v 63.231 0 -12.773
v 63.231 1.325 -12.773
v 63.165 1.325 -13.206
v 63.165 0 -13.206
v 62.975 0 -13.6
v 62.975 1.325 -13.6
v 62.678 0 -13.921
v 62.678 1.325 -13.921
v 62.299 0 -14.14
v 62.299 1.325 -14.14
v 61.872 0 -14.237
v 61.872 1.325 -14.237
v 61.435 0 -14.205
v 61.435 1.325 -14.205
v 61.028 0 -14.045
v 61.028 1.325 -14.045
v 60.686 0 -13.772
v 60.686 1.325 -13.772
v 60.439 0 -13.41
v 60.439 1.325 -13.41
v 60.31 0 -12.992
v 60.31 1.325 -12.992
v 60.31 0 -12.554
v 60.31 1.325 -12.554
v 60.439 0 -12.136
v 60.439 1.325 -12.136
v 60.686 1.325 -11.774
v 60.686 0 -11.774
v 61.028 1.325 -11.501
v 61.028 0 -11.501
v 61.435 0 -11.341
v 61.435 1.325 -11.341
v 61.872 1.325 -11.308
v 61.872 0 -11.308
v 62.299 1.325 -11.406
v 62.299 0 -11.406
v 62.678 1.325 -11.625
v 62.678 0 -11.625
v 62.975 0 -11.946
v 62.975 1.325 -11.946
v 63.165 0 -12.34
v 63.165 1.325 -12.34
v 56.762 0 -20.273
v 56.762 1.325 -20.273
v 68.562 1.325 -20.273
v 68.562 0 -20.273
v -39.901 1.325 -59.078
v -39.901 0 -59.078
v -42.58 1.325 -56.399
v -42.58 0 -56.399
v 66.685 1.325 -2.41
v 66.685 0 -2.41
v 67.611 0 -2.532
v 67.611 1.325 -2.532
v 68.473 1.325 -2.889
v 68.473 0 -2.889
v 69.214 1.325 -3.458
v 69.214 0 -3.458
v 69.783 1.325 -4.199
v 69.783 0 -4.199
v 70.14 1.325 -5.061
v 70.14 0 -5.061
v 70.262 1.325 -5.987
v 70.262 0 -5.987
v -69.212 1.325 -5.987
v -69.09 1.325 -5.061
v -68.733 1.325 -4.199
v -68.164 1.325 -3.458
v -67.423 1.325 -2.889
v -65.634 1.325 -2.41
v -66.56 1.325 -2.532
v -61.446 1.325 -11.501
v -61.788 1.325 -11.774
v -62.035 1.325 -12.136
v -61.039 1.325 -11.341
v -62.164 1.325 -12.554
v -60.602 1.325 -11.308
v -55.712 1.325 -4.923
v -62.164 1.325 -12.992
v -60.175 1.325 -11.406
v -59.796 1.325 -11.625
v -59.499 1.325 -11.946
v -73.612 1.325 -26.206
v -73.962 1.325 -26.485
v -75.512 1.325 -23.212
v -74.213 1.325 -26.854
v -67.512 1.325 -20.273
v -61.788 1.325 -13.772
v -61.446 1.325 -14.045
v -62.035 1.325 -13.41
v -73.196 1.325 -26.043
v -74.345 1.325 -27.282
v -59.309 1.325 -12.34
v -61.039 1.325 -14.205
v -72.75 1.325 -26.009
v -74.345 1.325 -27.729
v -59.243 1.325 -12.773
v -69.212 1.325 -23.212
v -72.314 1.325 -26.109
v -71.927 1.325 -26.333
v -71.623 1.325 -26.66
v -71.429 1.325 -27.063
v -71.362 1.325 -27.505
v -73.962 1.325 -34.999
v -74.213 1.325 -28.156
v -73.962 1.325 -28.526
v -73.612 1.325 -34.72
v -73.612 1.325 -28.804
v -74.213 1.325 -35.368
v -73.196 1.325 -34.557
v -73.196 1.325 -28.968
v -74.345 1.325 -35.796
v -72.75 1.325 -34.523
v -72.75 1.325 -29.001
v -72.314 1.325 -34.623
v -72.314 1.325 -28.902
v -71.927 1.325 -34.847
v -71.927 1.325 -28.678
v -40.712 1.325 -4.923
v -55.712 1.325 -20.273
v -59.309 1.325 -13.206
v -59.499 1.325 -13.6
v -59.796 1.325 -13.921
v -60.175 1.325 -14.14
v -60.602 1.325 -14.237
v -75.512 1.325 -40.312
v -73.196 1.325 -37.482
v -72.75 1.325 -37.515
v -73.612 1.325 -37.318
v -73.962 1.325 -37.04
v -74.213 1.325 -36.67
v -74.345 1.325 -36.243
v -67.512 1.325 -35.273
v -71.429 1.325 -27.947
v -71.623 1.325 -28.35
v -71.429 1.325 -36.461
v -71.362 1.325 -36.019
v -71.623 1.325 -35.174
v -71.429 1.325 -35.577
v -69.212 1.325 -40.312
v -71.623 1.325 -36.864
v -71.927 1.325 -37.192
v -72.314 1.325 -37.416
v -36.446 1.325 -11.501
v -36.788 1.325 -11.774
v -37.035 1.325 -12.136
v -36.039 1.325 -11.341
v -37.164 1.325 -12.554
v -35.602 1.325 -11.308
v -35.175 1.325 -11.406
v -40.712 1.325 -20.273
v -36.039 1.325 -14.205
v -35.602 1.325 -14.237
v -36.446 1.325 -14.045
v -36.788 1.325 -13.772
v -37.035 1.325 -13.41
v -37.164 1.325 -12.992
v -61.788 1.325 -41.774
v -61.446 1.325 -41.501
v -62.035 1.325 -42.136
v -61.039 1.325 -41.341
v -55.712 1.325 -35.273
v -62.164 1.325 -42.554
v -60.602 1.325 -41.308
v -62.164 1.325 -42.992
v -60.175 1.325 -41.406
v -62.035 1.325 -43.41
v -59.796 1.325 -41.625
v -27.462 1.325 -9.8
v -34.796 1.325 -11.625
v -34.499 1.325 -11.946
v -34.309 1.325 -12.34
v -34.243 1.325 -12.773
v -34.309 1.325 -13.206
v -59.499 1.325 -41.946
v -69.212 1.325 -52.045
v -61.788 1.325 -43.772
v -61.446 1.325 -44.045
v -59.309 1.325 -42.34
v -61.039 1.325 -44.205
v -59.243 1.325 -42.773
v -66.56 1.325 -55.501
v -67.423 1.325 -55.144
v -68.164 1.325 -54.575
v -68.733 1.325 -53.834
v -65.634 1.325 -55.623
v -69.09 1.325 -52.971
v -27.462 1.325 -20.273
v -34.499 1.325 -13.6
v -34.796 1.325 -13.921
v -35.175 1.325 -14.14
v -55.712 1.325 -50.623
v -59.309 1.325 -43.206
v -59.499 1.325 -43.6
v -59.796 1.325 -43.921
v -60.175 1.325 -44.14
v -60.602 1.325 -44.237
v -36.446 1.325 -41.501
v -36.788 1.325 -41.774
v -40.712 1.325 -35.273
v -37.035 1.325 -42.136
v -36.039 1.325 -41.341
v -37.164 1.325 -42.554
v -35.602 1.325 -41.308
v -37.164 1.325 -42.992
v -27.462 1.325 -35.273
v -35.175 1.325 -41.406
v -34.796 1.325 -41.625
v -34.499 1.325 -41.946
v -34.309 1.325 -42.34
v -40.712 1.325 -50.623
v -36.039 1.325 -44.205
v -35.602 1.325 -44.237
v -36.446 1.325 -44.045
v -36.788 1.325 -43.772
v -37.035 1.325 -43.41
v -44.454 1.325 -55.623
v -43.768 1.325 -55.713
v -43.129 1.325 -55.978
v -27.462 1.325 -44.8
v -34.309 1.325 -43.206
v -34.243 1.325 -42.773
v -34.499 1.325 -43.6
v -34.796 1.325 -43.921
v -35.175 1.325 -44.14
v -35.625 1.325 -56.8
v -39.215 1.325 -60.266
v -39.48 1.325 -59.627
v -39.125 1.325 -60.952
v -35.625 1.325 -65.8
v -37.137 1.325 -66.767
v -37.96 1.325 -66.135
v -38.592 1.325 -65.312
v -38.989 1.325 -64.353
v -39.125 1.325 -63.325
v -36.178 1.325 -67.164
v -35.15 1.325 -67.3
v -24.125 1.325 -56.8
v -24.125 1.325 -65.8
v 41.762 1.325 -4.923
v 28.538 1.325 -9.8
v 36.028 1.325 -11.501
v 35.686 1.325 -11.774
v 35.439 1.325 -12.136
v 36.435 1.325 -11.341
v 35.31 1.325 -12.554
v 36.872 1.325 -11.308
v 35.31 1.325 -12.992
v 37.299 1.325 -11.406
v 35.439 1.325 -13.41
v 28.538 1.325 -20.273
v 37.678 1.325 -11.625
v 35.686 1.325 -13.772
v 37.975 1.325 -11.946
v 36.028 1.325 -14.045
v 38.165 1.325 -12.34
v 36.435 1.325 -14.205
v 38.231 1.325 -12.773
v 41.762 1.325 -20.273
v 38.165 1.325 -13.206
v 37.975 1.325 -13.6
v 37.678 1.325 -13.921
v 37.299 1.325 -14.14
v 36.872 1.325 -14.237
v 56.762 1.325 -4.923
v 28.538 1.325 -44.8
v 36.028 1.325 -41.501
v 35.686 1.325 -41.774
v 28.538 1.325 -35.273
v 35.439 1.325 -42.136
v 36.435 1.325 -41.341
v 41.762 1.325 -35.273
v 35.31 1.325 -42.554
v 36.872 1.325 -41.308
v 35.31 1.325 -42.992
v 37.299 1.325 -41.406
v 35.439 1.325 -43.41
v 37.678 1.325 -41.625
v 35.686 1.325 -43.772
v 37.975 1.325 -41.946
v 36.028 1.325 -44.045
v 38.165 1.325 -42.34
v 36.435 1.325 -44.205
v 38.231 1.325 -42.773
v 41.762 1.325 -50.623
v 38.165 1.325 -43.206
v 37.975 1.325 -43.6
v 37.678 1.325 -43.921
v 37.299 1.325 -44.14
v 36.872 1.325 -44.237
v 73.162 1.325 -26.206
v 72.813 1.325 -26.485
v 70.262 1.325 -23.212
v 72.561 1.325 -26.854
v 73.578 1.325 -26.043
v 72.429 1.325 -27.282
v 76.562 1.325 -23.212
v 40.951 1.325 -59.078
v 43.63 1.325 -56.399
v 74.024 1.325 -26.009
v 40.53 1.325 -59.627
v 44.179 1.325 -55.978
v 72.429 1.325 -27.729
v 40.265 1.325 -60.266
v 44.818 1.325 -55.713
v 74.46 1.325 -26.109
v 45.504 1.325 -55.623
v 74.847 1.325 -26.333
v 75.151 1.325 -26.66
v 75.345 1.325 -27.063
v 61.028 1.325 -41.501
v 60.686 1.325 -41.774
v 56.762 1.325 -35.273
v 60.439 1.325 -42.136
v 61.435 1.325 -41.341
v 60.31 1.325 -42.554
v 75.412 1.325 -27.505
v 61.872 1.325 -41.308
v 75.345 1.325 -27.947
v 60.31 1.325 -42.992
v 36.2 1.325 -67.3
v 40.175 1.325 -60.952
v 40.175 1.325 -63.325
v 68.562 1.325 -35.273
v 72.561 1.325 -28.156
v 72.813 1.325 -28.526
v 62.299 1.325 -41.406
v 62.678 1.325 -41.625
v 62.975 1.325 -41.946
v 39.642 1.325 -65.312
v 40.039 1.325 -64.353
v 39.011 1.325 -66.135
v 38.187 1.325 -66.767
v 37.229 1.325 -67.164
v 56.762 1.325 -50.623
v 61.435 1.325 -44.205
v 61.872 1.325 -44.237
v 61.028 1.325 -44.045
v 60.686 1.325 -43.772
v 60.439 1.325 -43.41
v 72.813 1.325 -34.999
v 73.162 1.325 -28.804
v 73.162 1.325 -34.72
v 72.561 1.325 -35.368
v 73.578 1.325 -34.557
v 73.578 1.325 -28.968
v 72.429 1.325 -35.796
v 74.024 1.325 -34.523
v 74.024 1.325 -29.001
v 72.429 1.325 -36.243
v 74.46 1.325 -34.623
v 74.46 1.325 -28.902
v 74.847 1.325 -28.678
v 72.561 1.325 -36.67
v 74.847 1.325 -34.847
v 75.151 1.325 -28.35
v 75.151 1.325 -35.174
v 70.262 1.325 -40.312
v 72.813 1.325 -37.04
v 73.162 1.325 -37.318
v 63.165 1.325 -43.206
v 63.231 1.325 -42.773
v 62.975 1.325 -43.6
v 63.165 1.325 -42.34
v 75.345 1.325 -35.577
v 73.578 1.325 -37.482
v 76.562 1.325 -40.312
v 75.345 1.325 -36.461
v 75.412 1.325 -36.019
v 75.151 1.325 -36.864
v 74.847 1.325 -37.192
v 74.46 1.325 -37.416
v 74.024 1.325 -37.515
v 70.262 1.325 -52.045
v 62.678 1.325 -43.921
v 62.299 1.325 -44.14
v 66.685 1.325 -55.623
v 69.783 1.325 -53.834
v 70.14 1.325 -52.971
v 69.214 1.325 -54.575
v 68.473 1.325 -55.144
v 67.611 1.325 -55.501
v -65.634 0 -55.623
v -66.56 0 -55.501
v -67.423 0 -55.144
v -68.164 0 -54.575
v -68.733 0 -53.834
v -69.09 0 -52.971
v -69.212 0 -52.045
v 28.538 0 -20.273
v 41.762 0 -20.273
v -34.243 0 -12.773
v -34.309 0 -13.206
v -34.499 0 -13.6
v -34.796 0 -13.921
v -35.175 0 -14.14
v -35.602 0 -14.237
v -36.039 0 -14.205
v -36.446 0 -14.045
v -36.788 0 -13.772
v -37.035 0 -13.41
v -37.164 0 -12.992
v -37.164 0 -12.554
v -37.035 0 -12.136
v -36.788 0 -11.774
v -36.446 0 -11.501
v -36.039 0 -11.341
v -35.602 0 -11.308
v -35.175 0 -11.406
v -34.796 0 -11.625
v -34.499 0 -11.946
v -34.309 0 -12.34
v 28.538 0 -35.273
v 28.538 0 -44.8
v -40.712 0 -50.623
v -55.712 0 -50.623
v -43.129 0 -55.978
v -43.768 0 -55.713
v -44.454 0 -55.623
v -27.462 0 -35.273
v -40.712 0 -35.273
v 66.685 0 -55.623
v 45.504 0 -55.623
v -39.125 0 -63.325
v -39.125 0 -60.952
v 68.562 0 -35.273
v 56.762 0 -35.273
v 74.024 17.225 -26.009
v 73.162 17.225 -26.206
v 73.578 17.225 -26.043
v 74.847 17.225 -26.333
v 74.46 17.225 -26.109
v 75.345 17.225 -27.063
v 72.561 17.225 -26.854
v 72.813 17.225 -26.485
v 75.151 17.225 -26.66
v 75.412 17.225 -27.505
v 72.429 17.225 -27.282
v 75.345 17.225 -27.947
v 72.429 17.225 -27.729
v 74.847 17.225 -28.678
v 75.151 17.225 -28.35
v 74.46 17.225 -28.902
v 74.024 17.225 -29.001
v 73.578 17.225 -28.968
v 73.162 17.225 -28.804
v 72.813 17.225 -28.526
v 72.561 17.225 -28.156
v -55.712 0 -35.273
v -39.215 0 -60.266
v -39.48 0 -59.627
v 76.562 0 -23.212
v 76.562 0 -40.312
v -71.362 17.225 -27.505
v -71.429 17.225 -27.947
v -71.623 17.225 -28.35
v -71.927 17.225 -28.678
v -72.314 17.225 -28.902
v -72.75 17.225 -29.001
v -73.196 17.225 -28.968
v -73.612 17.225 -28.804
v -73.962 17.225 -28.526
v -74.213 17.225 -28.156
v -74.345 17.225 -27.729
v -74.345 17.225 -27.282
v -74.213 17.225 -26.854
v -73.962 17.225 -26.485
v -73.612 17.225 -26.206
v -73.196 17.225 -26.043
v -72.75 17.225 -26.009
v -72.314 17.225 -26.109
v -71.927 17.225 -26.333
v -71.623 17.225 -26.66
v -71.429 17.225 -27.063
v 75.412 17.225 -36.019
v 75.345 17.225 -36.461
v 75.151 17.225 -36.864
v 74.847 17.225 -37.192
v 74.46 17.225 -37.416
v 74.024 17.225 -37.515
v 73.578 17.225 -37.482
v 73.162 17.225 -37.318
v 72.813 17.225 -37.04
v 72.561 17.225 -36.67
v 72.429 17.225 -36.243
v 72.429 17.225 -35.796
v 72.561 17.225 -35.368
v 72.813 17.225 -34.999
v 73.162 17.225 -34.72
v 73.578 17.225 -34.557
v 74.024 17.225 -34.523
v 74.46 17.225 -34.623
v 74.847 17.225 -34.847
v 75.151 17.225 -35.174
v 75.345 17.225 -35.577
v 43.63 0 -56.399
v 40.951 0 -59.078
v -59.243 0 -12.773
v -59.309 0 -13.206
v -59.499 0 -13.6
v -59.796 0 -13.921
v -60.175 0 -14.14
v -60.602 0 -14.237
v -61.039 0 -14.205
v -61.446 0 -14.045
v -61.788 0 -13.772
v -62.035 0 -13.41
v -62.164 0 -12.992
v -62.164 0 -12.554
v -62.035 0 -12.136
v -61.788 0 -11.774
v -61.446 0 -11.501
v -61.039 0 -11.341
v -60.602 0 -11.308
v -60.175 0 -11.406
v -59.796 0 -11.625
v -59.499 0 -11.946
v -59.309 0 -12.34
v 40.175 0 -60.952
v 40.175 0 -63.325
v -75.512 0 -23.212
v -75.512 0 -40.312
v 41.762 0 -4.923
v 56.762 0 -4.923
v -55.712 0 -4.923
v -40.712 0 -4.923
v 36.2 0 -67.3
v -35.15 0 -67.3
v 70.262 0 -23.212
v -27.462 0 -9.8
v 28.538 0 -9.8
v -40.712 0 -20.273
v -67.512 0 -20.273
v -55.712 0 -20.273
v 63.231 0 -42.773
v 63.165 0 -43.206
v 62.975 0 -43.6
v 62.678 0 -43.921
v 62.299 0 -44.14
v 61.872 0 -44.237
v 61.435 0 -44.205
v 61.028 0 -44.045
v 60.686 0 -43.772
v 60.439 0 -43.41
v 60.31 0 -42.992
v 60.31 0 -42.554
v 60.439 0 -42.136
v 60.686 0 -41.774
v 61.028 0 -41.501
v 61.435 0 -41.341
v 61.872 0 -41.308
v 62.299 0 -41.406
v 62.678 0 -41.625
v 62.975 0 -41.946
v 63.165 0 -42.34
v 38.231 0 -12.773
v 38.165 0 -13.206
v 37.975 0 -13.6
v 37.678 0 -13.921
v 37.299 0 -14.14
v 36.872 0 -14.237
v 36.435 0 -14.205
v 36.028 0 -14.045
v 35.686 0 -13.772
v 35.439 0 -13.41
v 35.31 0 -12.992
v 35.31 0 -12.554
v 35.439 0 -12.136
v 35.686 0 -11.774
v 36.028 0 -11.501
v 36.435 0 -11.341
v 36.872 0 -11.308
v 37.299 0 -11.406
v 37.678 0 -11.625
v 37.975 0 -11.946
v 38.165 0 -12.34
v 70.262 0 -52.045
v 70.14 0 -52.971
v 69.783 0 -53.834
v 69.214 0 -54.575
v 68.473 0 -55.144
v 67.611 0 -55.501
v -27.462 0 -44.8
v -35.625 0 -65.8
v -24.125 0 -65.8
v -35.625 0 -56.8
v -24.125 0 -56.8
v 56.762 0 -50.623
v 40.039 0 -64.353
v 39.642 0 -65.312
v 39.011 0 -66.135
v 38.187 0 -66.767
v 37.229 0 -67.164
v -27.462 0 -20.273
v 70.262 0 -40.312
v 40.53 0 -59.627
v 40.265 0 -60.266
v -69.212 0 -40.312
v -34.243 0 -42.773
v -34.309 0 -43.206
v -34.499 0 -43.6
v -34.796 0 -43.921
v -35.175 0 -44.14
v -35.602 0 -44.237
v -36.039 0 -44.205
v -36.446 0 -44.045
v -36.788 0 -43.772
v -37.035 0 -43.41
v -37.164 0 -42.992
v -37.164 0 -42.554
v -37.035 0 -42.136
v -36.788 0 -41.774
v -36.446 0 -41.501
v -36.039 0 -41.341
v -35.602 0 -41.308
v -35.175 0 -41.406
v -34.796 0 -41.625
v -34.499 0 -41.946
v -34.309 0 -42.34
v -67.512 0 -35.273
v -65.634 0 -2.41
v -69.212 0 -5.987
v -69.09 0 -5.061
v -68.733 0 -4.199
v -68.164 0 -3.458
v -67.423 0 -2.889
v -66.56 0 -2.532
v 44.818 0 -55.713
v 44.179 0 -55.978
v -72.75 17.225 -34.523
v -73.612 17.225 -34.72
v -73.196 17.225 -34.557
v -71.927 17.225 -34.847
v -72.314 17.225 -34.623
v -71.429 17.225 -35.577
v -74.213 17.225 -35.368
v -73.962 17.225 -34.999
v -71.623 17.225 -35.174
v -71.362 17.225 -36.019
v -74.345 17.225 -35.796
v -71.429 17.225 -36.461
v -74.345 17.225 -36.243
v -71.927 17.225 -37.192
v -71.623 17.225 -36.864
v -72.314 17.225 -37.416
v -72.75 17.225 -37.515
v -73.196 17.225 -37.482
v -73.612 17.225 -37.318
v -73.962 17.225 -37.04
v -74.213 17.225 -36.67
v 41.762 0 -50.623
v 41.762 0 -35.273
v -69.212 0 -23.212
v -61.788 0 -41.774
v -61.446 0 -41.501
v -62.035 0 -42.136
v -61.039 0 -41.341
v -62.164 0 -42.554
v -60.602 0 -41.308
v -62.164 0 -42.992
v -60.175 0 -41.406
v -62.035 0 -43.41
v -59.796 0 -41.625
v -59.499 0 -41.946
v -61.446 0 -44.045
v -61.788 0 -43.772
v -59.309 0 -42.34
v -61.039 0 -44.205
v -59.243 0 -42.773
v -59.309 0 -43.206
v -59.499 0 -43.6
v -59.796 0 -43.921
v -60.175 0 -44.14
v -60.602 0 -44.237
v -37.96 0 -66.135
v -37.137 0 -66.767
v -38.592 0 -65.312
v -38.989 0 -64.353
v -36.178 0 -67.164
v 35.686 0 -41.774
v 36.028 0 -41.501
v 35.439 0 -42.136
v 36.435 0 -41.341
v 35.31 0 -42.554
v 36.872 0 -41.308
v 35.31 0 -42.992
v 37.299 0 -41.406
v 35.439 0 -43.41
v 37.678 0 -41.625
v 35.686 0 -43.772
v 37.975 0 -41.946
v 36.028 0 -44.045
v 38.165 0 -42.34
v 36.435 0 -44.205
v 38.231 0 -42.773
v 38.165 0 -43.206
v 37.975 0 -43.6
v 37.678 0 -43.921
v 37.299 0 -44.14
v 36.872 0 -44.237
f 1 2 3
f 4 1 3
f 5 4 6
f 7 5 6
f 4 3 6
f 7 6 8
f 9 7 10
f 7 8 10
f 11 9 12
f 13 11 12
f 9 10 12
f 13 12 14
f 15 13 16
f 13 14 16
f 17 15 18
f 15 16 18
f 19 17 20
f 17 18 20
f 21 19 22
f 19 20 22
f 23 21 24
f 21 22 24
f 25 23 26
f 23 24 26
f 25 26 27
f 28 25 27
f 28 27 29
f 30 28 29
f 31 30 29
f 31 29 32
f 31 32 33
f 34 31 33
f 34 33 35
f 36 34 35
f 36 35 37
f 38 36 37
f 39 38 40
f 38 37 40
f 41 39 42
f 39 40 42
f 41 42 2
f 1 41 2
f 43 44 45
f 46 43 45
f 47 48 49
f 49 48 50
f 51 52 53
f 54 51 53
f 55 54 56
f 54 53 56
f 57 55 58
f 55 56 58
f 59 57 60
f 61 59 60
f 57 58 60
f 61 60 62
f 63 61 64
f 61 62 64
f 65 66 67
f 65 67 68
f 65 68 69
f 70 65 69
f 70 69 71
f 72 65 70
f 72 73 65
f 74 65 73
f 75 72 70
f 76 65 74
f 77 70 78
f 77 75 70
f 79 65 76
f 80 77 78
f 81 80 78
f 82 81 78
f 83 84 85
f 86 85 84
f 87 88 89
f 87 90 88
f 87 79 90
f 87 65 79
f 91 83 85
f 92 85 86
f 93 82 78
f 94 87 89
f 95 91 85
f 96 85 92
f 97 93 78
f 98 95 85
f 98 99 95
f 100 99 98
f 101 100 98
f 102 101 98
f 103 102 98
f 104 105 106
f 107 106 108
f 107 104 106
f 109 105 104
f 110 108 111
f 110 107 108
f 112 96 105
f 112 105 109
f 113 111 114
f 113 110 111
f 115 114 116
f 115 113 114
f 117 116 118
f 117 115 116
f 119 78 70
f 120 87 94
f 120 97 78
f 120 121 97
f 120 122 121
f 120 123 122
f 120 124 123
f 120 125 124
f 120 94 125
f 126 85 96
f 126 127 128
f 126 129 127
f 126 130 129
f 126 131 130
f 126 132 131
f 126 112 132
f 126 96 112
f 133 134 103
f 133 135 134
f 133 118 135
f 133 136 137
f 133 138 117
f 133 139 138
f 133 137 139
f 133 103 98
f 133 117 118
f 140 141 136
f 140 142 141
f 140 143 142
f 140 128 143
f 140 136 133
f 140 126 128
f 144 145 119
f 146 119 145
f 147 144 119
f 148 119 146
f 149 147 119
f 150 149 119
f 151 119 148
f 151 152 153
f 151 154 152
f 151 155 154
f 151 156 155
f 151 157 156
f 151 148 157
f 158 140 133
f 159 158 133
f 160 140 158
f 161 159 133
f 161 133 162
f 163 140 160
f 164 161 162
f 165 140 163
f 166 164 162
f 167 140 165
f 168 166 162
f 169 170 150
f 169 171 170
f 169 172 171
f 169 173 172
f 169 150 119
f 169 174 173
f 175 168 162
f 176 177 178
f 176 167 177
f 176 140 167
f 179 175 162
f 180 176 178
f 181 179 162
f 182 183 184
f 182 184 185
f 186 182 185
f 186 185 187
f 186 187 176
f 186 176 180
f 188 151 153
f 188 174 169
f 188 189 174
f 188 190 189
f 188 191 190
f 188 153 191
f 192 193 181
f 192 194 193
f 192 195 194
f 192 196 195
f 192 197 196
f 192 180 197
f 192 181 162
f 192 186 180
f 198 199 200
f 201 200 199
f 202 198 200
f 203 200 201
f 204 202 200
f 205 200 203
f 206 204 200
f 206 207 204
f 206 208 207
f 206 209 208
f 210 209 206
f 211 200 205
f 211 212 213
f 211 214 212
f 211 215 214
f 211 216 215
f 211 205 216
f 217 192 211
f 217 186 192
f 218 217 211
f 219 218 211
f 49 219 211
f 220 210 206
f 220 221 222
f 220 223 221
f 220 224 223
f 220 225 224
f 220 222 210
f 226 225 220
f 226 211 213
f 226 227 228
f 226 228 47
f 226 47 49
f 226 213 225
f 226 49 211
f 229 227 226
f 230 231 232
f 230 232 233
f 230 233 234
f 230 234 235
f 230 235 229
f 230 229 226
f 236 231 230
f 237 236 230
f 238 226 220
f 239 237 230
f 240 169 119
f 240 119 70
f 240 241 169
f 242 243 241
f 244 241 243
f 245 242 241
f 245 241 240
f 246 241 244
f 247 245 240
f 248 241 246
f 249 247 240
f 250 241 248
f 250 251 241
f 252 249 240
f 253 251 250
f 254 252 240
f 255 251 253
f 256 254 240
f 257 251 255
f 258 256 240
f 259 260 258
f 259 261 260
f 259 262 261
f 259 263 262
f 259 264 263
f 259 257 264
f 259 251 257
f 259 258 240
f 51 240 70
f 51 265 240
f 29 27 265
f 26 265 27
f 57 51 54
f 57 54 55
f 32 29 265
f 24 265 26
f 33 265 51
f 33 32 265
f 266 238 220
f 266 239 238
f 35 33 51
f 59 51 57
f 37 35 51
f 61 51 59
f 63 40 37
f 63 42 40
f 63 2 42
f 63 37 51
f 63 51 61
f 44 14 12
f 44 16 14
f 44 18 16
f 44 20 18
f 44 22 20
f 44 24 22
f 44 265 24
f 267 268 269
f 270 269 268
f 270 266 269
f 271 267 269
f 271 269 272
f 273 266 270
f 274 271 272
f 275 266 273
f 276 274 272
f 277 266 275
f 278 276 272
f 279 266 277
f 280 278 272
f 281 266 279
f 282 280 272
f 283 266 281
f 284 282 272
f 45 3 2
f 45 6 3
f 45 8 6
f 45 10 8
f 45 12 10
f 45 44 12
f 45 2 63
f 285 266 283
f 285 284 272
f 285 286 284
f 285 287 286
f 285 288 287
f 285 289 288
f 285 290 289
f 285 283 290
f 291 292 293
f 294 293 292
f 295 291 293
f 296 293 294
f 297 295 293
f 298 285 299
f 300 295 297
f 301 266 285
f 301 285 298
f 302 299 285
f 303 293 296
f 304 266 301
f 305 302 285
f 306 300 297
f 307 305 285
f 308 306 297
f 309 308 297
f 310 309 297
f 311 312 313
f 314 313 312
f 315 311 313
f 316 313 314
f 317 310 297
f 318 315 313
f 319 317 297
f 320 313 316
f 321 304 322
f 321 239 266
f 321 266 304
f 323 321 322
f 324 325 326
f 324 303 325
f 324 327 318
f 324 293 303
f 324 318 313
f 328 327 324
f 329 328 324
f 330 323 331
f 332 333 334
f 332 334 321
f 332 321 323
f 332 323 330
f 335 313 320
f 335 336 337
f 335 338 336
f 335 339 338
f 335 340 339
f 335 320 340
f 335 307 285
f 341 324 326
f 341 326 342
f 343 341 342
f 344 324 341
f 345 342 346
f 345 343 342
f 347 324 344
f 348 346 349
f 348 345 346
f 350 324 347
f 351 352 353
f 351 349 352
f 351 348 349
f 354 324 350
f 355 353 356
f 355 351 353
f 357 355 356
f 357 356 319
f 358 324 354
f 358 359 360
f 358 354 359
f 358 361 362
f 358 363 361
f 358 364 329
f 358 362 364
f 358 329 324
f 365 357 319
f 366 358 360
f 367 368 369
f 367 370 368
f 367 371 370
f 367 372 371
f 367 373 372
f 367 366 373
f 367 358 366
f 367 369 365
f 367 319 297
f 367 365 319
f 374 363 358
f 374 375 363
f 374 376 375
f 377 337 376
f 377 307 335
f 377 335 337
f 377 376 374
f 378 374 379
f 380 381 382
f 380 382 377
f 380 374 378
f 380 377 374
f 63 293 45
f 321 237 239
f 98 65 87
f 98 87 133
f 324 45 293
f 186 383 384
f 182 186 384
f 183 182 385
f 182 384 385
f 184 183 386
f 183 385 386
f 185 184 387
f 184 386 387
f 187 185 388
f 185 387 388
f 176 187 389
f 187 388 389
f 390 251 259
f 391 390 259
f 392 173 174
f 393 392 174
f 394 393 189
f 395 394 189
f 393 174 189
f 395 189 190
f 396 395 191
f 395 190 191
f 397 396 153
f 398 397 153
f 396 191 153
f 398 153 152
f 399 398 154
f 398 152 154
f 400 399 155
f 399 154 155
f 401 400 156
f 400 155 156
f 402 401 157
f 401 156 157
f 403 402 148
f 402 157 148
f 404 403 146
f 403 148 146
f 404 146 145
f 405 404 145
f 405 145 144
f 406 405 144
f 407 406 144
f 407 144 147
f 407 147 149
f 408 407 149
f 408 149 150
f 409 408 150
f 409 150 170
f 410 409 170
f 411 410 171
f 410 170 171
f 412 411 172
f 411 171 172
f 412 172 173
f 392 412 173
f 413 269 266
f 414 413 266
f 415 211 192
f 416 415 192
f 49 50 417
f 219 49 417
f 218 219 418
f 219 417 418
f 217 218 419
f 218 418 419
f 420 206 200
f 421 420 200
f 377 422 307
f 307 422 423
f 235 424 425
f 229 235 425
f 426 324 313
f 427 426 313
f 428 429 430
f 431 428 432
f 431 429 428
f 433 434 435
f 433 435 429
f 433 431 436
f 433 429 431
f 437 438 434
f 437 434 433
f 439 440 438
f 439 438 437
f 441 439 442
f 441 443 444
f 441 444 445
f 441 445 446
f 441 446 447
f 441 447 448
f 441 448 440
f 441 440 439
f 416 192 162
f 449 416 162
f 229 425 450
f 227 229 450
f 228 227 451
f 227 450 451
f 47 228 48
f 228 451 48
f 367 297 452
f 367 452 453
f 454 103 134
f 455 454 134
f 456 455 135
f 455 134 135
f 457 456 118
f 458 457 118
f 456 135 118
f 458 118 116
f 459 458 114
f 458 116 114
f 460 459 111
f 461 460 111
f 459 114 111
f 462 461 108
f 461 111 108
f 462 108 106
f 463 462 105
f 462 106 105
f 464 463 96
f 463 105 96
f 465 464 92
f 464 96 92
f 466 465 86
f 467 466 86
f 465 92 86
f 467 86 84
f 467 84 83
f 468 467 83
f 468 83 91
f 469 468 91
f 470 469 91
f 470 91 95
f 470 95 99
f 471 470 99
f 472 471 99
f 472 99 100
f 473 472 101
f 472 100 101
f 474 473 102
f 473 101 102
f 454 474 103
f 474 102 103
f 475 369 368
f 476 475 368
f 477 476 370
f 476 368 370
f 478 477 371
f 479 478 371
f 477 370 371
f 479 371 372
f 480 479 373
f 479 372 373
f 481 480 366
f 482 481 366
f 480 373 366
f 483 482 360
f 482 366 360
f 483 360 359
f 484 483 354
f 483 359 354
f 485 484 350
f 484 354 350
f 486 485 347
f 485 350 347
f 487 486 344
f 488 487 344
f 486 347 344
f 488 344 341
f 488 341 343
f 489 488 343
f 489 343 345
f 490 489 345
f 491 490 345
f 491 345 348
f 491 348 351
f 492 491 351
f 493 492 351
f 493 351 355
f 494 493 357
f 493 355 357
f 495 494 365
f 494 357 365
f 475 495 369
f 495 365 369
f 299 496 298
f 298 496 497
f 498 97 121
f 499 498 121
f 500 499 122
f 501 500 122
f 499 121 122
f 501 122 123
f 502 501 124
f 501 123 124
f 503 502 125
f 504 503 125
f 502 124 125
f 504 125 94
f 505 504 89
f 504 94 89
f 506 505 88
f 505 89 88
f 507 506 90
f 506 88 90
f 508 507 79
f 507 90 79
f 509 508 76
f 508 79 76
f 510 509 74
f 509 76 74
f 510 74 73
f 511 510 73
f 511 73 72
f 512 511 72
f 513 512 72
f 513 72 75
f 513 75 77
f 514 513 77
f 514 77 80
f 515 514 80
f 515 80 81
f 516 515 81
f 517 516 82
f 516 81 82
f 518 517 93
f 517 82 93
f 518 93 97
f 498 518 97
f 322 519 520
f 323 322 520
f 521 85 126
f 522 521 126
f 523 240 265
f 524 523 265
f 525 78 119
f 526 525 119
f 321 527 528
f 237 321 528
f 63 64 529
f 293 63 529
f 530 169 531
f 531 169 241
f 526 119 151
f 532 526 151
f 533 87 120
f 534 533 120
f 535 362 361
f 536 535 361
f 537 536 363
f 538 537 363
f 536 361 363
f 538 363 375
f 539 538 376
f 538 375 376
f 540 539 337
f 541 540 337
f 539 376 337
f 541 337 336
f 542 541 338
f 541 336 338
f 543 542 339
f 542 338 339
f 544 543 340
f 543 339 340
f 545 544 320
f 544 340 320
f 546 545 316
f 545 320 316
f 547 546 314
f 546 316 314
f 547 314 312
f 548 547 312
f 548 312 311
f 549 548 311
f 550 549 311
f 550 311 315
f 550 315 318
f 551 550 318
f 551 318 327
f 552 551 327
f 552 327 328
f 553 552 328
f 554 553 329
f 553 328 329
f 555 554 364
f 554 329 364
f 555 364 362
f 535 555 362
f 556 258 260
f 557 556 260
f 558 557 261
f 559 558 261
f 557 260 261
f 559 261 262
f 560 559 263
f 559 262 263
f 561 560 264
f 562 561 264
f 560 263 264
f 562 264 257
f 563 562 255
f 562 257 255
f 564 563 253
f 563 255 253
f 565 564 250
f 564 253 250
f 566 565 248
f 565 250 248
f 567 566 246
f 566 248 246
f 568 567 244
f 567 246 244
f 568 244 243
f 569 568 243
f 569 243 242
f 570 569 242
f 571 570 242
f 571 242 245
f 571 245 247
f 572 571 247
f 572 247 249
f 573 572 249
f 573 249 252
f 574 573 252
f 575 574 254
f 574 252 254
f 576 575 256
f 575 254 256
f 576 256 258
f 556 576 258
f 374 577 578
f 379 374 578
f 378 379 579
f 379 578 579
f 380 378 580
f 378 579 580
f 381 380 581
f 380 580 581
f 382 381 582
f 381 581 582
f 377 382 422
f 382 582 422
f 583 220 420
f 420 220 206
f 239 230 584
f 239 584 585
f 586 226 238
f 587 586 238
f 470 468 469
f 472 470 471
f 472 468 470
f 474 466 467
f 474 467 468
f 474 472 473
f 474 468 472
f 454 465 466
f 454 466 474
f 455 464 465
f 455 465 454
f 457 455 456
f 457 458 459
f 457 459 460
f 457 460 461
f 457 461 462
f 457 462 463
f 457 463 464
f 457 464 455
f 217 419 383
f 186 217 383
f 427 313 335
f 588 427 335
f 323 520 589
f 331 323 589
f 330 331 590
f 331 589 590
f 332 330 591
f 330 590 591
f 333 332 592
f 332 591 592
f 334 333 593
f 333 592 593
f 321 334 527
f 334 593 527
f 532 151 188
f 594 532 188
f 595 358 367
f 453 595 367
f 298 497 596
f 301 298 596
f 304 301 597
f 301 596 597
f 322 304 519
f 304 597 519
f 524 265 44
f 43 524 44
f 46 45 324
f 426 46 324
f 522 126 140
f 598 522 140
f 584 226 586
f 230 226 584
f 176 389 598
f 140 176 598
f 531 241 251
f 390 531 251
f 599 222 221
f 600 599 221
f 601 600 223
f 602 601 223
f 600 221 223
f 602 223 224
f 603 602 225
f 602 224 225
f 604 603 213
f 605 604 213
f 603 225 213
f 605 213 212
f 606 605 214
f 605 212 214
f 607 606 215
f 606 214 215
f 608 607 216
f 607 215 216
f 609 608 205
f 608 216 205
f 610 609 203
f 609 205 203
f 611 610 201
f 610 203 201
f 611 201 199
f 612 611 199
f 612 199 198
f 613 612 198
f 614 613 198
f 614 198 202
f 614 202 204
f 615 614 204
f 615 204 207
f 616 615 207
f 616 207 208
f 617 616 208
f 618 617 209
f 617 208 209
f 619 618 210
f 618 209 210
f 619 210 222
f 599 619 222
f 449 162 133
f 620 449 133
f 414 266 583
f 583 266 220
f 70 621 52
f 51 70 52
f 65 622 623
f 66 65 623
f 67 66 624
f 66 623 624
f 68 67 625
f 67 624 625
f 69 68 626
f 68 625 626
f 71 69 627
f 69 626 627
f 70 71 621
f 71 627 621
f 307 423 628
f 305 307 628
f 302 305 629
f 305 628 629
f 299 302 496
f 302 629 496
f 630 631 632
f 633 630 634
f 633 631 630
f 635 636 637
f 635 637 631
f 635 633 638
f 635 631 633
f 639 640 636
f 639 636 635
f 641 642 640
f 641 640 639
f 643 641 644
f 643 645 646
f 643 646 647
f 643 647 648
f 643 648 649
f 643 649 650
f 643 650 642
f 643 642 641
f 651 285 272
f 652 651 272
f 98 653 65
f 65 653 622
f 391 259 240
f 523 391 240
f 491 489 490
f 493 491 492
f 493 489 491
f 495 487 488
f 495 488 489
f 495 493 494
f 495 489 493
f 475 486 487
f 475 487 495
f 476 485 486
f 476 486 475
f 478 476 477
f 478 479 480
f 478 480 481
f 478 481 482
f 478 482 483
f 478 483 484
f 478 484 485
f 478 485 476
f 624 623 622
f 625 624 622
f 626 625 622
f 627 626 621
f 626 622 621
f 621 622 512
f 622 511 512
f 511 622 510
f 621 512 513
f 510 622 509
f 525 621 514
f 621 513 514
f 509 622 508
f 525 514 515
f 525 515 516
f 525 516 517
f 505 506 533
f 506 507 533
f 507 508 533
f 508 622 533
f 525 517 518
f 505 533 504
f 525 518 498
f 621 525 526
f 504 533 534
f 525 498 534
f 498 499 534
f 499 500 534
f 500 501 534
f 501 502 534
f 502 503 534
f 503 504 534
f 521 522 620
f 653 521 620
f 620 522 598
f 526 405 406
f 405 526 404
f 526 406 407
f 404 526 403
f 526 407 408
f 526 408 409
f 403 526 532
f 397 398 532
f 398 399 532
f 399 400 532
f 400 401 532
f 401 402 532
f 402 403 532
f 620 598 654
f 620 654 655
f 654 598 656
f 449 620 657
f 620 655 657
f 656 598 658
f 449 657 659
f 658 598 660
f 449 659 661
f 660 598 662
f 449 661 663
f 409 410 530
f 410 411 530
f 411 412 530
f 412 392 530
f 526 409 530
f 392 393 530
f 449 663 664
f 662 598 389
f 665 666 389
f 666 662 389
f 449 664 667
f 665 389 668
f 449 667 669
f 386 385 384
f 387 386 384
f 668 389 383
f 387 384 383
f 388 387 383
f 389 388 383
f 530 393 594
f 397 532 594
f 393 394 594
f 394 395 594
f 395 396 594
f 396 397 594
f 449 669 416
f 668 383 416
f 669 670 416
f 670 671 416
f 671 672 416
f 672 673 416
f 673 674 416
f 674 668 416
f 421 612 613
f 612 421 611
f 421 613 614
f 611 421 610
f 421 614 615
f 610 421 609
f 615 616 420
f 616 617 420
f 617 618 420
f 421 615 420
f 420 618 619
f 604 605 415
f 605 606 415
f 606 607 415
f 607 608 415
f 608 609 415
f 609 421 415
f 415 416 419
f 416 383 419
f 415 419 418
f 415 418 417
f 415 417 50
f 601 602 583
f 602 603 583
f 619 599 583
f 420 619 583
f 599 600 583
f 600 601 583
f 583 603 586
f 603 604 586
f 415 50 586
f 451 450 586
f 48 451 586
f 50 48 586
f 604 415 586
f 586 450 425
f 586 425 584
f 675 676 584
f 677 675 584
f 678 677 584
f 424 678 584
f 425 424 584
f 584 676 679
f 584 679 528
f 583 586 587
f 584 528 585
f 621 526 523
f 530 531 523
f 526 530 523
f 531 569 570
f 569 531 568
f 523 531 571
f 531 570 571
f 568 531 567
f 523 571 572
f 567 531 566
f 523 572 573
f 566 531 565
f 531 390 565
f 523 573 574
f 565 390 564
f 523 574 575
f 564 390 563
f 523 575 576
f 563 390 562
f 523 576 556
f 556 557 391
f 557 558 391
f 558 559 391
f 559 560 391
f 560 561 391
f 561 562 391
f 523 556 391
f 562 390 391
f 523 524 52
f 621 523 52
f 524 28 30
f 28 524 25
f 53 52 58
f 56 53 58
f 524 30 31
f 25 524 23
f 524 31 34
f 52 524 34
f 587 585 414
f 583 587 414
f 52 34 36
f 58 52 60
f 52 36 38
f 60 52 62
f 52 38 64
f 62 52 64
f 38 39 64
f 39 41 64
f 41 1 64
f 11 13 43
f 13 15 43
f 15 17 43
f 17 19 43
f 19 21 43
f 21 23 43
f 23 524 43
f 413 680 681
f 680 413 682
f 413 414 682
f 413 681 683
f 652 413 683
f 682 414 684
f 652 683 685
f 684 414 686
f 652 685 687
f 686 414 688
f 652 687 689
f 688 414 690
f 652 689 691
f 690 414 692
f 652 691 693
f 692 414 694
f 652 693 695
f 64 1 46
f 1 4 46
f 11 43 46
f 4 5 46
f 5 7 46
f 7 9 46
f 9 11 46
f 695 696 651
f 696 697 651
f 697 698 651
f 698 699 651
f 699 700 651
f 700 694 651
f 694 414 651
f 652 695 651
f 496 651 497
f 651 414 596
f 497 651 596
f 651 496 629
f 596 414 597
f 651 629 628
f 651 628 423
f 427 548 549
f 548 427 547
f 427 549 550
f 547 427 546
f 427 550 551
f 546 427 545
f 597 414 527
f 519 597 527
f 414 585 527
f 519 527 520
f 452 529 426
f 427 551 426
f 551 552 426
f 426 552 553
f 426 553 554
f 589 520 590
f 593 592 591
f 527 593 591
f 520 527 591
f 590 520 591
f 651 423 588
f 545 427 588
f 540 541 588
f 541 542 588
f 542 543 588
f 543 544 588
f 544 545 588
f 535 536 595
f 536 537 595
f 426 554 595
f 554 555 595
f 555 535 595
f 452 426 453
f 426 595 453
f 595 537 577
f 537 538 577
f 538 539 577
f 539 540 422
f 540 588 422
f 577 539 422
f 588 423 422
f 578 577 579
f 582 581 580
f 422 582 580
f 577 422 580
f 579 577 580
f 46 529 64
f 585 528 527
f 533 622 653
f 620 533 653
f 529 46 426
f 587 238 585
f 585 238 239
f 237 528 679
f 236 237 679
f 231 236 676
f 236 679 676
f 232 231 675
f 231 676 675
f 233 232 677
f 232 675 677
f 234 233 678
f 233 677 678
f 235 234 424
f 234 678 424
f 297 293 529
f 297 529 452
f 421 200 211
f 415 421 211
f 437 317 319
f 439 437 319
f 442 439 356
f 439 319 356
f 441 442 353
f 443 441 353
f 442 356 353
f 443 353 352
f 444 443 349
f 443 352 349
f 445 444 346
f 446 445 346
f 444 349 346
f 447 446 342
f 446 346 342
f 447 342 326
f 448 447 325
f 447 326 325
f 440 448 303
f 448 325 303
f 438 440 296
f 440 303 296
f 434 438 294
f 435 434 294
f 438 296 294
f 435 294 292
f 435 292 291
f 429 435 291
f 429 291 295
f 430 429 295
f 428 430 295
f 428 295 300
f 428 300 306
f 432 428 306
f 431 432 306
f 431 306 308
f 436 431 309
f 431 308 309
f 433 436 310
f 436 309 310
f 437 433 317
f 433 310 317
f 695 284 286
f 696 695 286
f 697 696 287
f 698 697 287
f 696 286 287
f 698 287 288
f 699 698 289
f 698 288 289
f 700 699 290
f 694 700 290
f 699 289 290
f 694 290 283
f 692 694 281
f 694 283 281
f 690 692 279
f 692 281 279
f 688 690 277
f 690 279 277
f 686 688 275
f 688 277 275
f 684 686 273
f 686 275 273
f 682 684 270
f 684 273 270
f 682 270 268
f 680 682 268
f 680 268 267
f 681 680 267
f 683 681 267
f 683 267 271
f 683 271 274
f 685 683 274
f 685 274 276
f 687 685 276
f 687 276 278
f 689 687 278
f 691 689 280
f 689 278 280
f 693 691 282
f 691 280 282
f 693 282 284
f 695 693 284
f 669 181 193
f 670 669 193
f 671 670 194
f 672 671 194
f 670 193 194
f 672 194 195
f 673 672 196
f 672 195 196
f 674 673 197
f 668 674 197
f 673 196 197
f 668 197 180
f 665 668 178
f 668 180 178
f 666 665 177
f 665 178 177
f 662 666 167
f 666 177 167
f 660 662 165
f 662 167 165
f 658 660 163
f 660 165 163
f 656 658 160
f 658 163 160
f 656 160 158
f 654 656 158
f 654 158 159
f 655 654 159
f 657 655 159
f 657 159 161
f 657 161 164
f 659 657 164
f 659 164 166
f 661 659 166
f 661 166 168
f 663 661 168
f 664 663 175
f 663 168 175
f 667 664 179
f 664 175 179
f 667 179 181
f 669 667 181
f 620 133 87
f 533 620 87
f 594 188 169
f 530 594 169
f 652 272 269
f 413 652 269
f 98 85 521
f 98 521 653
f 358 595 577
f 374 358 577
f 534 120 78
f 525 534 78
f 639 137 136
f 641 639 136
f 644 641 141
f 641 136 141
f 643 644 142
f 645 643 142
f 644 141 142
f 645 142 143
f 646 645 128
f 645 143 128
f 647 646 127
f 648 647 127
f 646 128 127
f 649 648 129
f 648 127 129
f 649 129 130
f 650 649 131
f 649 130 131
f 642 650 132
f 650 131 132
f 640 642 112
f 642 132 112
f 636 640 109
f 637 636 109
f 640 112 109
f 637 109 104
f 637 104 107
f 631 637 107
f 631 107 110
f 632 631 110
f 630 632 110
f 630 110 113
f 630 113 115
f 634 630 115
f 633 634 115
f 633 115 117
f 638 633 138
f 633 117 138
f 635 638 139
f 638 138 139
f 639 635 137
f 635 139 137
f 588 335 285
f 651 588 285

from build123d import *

# Parameters (mm, degrees)
BOSS_EXTRUDE1_DEPTH = 5
SCALE2_SCALE        = 0.265
SKETCH6_W           = 6.3
SKETCH6_H           = 17.1
BOSS_EXTRUDE2_DEPTH = 1.325
SKETCH5_W           = 11.5
SKETCH5_H           = 9
SKETCH5_R           = 1.468522593
CUT_EXTRUDE1_DEPTH  = 1.325
SKETCH8_R           = 1.5
BOSS_EXTRUDE5_DEPTH = 15.9


with BuildPart() as part:
    # Sketch1 → Boss-Extrude1 (new body)
    with BuildSketch(Plane(origin=(0, 0, 0), x_dir=(1, 0, 0), z_dir=(0, 1, 0))):
        with BuildLine():
            Line((-247.677130459, 9.093460821), (0, 9.093460821))
            Line((0, 9.093460821), (1.981474539, 9.093460821))
            Line((1.981474539, 9.093460821), (3.962949079, 9.093460821))
            Line((3.962949079, 9.093460821), (251.640079537, 9.093460821))
            ThreePointArc((251.640079537, 9.093460821), (261.186021083, 13.047519275), (265.140079537, 22.593460821))
            Line((265.140079537, 22.593460821), (265.140079537, 87.593460821))
            Line((265.140079537, 87.593460821), (265.140079537, 152.207743366))
            Line((265.140079537, 152.207743366), (265.140079537, 196.397667024))
            ThreePointArc((265.140079537, 196.397667024), (261.186021083, 205.94360857), (251.640079537, 209.897667024))
            Line((251.640079537, 209.897667024), (171.71214435, 209.897667024))
            ThreePointArc((171.71214435, 209.897667024), (167.885310027, 210.658871699), (164.641076538, 212.826599212))
            Line((164.641076538, 212.826599212), (154.53187981, 222.935795941))
            ThreePointArc((154.53187981, 222.935795941), (152.364152296, 226.180029429), (151.602947621, 230.006863753))
            Line((151.602947621, 230.006863753), (151.602947621, 238.96110688))
            ThreePointArc((151.602947621, 238.96110688), (147.209549339, 249.567708598), (136.602947621, 253.96110688))
            Line((136.602947621, 253.96110688), (3.962949079, 253.96110688))
            Line((3.962949079, 253.96110688), (0, 253.96110688))
            Line((0, 253.96110688), (-132.639998543, 253.96110688))
            ThreePointArc((-132.639998543, 253.96110688), (-143.246600261, 249.567708598), (-147.639998543, 238.96110688))
            Line((-147.639998543, 238.96110688), (-147.639998543, 230.006863753))
            ThreePointArc((-147.639998543, 230.006863753), (-148.401203218, 226.180029429), (-150.568930731, 222.935795941))
            Line((-150.568930731, 222.935795941), (-160.67812746, 212.826599212))
            ThreePointArc((-160.67812746, 212.826599212), (-163.922360948, 210.658871699), (-167.749195272, 209.897667024))
            Line((-167.749195272, 209.897667024), (-247.677130459, 209.897667024))
            ThreePointArc((-247.677130459, 209.897667024), (-257.223072005, 205.94360857), (-261.177130459, 196.397667024))
            Line((-261.177130459, 196.397667024), (-261.177130459, 152.207743366))
            Line((-261.177130459, 152.207743366), (-261.177130459, 87.593460821))
            Line((-261.177130459, 87.593460821), (-261.177130459, 22.593460821))
            ThreePointArc((-261.177130459, 22.593460821), (-257.223072005, 13.047519275), (-247.677130459, 9.093460821))
        make_face()
    extrude(amount=BOSS_EXTRUDE1_DEPTH)


with BuildPart() as part_1:
    # Scale2: scaled about (0, 0, 0)
    add(part.part.scale(SCALE2_SCALE))

    # Sketch6 → Boss-Extrude2 (add)
    with BuildSketch(Plane(origin=(0, 1.325, 0), x_dir=(1, 0, 0), z_dir=(0, 1, 0))):
        with Locations((-72.361939572, 31.762267118)):
            Rectangle(SKETCH6_W, SKETCH6_H)
        with Locations((73.412121077, 31.762267118)):
            Rectangle(SKETCH6_W, SKETCH6_H)
    extrude(amount=-BOSS_EXTRUDE2_DEPTH)

    # Sketch5 → Cut-Extrude1 (cut)
    with BuildSketch(Plane(origin=(0, 1.325, 0), x_dir=(1, 0, 0), z_dir=(0, 1, 0))):
        Polygon((-67.511939572, 27.772881761), (-67.511939572, 20.272881761), (-55.711939572, 20.272881761), (-55.711939572, 4.922881761), (-40.711939572, 4.922881761), (-40.711939572, 20.272881761), (-27.461939572, 20.272881761), (-27.461939572, 9.799693323), (28.538060428, 9.799693323), (28.538060428, 20.272881761), (41.762121077, 20.272881761), (41.762121077, 4.922881761), (56.762121077, 4.922881761), (56.762121077, 20.272881761), (68.562121077, 20.272881761), (68.562121077, 35.272881761), (56.762121077, 35.272881761), (56.762121077, 50.622881761), (41.762121077, 50.622881761), (41.762121077, 35.272881761), (28.538060428, 35.272881761), (28.538060428, 44.799693323), (-27.461939572, 44.799693323), (-27.461939572, 35.272881761), (-40.711939572, 35.272881761), (-40.711939572, 50.622881761), (-55.711939572, 50.622881761), (-55.711939572, 35.272881761), (-67.511939572, 35.272881761), align=None)
        with Locations((-29.874599614, 61.299693323)):
            Rectangle(SKETCH5_W, SKETCH5_H)
        with Locations((-35.711939572, 42.772881761)):
            Circle(SKETCH5_R)
        with Locations((-60.711939572, 42.772881761)):
            Circle(SKETCH5_R)
        with Locations((-60.711939572, 12.772881761)):
            Circle(SKETCH5_R)
        with Locations((-35.711939572, 12.772881761)):
            Circle(SKETCH5_R)
        with Locations((36.762121077, 12.772881761)):
            Circle(SKETCH5_R)
        with Locations((61.762121077, 12.772881761)):
            Circle(SKETCH5_R)
        with Locations((36.762121077, 42.772881761)):
            Circle(SKETCH5_R)
        with Locations((61.762121077, 42.772881761)):
            Circle(SKETCH5_R)
    extrude(amount=-CUT_EXTRUDE1_DEPTH, mode=Mode.SUBTRACT)

    # Sketch8 → Boss-Extrude5 (add)
    with BuildSketch(Plane(origin=(0, 1.325, 0), x_dir=(1, 0, 0), z_dir=(0, 1, 0))):
        with Locations((-72.861939572, 36.019267118)):
            Circle(SKETCH8_R)
        with Locations((-72.861939572, 27.505267118)):
            Circle(SKETCH8_R)
        with Locations((73.912121077, 36.019267118)):
            Circle(SKETCH8_R)
        with Locations((73.912121077, 27.505267118)):
            Circle(SKETCH8_R)
    extrude(amount=BOSS_EXTRUDE5_DEPTH)


solid = part_1.part
